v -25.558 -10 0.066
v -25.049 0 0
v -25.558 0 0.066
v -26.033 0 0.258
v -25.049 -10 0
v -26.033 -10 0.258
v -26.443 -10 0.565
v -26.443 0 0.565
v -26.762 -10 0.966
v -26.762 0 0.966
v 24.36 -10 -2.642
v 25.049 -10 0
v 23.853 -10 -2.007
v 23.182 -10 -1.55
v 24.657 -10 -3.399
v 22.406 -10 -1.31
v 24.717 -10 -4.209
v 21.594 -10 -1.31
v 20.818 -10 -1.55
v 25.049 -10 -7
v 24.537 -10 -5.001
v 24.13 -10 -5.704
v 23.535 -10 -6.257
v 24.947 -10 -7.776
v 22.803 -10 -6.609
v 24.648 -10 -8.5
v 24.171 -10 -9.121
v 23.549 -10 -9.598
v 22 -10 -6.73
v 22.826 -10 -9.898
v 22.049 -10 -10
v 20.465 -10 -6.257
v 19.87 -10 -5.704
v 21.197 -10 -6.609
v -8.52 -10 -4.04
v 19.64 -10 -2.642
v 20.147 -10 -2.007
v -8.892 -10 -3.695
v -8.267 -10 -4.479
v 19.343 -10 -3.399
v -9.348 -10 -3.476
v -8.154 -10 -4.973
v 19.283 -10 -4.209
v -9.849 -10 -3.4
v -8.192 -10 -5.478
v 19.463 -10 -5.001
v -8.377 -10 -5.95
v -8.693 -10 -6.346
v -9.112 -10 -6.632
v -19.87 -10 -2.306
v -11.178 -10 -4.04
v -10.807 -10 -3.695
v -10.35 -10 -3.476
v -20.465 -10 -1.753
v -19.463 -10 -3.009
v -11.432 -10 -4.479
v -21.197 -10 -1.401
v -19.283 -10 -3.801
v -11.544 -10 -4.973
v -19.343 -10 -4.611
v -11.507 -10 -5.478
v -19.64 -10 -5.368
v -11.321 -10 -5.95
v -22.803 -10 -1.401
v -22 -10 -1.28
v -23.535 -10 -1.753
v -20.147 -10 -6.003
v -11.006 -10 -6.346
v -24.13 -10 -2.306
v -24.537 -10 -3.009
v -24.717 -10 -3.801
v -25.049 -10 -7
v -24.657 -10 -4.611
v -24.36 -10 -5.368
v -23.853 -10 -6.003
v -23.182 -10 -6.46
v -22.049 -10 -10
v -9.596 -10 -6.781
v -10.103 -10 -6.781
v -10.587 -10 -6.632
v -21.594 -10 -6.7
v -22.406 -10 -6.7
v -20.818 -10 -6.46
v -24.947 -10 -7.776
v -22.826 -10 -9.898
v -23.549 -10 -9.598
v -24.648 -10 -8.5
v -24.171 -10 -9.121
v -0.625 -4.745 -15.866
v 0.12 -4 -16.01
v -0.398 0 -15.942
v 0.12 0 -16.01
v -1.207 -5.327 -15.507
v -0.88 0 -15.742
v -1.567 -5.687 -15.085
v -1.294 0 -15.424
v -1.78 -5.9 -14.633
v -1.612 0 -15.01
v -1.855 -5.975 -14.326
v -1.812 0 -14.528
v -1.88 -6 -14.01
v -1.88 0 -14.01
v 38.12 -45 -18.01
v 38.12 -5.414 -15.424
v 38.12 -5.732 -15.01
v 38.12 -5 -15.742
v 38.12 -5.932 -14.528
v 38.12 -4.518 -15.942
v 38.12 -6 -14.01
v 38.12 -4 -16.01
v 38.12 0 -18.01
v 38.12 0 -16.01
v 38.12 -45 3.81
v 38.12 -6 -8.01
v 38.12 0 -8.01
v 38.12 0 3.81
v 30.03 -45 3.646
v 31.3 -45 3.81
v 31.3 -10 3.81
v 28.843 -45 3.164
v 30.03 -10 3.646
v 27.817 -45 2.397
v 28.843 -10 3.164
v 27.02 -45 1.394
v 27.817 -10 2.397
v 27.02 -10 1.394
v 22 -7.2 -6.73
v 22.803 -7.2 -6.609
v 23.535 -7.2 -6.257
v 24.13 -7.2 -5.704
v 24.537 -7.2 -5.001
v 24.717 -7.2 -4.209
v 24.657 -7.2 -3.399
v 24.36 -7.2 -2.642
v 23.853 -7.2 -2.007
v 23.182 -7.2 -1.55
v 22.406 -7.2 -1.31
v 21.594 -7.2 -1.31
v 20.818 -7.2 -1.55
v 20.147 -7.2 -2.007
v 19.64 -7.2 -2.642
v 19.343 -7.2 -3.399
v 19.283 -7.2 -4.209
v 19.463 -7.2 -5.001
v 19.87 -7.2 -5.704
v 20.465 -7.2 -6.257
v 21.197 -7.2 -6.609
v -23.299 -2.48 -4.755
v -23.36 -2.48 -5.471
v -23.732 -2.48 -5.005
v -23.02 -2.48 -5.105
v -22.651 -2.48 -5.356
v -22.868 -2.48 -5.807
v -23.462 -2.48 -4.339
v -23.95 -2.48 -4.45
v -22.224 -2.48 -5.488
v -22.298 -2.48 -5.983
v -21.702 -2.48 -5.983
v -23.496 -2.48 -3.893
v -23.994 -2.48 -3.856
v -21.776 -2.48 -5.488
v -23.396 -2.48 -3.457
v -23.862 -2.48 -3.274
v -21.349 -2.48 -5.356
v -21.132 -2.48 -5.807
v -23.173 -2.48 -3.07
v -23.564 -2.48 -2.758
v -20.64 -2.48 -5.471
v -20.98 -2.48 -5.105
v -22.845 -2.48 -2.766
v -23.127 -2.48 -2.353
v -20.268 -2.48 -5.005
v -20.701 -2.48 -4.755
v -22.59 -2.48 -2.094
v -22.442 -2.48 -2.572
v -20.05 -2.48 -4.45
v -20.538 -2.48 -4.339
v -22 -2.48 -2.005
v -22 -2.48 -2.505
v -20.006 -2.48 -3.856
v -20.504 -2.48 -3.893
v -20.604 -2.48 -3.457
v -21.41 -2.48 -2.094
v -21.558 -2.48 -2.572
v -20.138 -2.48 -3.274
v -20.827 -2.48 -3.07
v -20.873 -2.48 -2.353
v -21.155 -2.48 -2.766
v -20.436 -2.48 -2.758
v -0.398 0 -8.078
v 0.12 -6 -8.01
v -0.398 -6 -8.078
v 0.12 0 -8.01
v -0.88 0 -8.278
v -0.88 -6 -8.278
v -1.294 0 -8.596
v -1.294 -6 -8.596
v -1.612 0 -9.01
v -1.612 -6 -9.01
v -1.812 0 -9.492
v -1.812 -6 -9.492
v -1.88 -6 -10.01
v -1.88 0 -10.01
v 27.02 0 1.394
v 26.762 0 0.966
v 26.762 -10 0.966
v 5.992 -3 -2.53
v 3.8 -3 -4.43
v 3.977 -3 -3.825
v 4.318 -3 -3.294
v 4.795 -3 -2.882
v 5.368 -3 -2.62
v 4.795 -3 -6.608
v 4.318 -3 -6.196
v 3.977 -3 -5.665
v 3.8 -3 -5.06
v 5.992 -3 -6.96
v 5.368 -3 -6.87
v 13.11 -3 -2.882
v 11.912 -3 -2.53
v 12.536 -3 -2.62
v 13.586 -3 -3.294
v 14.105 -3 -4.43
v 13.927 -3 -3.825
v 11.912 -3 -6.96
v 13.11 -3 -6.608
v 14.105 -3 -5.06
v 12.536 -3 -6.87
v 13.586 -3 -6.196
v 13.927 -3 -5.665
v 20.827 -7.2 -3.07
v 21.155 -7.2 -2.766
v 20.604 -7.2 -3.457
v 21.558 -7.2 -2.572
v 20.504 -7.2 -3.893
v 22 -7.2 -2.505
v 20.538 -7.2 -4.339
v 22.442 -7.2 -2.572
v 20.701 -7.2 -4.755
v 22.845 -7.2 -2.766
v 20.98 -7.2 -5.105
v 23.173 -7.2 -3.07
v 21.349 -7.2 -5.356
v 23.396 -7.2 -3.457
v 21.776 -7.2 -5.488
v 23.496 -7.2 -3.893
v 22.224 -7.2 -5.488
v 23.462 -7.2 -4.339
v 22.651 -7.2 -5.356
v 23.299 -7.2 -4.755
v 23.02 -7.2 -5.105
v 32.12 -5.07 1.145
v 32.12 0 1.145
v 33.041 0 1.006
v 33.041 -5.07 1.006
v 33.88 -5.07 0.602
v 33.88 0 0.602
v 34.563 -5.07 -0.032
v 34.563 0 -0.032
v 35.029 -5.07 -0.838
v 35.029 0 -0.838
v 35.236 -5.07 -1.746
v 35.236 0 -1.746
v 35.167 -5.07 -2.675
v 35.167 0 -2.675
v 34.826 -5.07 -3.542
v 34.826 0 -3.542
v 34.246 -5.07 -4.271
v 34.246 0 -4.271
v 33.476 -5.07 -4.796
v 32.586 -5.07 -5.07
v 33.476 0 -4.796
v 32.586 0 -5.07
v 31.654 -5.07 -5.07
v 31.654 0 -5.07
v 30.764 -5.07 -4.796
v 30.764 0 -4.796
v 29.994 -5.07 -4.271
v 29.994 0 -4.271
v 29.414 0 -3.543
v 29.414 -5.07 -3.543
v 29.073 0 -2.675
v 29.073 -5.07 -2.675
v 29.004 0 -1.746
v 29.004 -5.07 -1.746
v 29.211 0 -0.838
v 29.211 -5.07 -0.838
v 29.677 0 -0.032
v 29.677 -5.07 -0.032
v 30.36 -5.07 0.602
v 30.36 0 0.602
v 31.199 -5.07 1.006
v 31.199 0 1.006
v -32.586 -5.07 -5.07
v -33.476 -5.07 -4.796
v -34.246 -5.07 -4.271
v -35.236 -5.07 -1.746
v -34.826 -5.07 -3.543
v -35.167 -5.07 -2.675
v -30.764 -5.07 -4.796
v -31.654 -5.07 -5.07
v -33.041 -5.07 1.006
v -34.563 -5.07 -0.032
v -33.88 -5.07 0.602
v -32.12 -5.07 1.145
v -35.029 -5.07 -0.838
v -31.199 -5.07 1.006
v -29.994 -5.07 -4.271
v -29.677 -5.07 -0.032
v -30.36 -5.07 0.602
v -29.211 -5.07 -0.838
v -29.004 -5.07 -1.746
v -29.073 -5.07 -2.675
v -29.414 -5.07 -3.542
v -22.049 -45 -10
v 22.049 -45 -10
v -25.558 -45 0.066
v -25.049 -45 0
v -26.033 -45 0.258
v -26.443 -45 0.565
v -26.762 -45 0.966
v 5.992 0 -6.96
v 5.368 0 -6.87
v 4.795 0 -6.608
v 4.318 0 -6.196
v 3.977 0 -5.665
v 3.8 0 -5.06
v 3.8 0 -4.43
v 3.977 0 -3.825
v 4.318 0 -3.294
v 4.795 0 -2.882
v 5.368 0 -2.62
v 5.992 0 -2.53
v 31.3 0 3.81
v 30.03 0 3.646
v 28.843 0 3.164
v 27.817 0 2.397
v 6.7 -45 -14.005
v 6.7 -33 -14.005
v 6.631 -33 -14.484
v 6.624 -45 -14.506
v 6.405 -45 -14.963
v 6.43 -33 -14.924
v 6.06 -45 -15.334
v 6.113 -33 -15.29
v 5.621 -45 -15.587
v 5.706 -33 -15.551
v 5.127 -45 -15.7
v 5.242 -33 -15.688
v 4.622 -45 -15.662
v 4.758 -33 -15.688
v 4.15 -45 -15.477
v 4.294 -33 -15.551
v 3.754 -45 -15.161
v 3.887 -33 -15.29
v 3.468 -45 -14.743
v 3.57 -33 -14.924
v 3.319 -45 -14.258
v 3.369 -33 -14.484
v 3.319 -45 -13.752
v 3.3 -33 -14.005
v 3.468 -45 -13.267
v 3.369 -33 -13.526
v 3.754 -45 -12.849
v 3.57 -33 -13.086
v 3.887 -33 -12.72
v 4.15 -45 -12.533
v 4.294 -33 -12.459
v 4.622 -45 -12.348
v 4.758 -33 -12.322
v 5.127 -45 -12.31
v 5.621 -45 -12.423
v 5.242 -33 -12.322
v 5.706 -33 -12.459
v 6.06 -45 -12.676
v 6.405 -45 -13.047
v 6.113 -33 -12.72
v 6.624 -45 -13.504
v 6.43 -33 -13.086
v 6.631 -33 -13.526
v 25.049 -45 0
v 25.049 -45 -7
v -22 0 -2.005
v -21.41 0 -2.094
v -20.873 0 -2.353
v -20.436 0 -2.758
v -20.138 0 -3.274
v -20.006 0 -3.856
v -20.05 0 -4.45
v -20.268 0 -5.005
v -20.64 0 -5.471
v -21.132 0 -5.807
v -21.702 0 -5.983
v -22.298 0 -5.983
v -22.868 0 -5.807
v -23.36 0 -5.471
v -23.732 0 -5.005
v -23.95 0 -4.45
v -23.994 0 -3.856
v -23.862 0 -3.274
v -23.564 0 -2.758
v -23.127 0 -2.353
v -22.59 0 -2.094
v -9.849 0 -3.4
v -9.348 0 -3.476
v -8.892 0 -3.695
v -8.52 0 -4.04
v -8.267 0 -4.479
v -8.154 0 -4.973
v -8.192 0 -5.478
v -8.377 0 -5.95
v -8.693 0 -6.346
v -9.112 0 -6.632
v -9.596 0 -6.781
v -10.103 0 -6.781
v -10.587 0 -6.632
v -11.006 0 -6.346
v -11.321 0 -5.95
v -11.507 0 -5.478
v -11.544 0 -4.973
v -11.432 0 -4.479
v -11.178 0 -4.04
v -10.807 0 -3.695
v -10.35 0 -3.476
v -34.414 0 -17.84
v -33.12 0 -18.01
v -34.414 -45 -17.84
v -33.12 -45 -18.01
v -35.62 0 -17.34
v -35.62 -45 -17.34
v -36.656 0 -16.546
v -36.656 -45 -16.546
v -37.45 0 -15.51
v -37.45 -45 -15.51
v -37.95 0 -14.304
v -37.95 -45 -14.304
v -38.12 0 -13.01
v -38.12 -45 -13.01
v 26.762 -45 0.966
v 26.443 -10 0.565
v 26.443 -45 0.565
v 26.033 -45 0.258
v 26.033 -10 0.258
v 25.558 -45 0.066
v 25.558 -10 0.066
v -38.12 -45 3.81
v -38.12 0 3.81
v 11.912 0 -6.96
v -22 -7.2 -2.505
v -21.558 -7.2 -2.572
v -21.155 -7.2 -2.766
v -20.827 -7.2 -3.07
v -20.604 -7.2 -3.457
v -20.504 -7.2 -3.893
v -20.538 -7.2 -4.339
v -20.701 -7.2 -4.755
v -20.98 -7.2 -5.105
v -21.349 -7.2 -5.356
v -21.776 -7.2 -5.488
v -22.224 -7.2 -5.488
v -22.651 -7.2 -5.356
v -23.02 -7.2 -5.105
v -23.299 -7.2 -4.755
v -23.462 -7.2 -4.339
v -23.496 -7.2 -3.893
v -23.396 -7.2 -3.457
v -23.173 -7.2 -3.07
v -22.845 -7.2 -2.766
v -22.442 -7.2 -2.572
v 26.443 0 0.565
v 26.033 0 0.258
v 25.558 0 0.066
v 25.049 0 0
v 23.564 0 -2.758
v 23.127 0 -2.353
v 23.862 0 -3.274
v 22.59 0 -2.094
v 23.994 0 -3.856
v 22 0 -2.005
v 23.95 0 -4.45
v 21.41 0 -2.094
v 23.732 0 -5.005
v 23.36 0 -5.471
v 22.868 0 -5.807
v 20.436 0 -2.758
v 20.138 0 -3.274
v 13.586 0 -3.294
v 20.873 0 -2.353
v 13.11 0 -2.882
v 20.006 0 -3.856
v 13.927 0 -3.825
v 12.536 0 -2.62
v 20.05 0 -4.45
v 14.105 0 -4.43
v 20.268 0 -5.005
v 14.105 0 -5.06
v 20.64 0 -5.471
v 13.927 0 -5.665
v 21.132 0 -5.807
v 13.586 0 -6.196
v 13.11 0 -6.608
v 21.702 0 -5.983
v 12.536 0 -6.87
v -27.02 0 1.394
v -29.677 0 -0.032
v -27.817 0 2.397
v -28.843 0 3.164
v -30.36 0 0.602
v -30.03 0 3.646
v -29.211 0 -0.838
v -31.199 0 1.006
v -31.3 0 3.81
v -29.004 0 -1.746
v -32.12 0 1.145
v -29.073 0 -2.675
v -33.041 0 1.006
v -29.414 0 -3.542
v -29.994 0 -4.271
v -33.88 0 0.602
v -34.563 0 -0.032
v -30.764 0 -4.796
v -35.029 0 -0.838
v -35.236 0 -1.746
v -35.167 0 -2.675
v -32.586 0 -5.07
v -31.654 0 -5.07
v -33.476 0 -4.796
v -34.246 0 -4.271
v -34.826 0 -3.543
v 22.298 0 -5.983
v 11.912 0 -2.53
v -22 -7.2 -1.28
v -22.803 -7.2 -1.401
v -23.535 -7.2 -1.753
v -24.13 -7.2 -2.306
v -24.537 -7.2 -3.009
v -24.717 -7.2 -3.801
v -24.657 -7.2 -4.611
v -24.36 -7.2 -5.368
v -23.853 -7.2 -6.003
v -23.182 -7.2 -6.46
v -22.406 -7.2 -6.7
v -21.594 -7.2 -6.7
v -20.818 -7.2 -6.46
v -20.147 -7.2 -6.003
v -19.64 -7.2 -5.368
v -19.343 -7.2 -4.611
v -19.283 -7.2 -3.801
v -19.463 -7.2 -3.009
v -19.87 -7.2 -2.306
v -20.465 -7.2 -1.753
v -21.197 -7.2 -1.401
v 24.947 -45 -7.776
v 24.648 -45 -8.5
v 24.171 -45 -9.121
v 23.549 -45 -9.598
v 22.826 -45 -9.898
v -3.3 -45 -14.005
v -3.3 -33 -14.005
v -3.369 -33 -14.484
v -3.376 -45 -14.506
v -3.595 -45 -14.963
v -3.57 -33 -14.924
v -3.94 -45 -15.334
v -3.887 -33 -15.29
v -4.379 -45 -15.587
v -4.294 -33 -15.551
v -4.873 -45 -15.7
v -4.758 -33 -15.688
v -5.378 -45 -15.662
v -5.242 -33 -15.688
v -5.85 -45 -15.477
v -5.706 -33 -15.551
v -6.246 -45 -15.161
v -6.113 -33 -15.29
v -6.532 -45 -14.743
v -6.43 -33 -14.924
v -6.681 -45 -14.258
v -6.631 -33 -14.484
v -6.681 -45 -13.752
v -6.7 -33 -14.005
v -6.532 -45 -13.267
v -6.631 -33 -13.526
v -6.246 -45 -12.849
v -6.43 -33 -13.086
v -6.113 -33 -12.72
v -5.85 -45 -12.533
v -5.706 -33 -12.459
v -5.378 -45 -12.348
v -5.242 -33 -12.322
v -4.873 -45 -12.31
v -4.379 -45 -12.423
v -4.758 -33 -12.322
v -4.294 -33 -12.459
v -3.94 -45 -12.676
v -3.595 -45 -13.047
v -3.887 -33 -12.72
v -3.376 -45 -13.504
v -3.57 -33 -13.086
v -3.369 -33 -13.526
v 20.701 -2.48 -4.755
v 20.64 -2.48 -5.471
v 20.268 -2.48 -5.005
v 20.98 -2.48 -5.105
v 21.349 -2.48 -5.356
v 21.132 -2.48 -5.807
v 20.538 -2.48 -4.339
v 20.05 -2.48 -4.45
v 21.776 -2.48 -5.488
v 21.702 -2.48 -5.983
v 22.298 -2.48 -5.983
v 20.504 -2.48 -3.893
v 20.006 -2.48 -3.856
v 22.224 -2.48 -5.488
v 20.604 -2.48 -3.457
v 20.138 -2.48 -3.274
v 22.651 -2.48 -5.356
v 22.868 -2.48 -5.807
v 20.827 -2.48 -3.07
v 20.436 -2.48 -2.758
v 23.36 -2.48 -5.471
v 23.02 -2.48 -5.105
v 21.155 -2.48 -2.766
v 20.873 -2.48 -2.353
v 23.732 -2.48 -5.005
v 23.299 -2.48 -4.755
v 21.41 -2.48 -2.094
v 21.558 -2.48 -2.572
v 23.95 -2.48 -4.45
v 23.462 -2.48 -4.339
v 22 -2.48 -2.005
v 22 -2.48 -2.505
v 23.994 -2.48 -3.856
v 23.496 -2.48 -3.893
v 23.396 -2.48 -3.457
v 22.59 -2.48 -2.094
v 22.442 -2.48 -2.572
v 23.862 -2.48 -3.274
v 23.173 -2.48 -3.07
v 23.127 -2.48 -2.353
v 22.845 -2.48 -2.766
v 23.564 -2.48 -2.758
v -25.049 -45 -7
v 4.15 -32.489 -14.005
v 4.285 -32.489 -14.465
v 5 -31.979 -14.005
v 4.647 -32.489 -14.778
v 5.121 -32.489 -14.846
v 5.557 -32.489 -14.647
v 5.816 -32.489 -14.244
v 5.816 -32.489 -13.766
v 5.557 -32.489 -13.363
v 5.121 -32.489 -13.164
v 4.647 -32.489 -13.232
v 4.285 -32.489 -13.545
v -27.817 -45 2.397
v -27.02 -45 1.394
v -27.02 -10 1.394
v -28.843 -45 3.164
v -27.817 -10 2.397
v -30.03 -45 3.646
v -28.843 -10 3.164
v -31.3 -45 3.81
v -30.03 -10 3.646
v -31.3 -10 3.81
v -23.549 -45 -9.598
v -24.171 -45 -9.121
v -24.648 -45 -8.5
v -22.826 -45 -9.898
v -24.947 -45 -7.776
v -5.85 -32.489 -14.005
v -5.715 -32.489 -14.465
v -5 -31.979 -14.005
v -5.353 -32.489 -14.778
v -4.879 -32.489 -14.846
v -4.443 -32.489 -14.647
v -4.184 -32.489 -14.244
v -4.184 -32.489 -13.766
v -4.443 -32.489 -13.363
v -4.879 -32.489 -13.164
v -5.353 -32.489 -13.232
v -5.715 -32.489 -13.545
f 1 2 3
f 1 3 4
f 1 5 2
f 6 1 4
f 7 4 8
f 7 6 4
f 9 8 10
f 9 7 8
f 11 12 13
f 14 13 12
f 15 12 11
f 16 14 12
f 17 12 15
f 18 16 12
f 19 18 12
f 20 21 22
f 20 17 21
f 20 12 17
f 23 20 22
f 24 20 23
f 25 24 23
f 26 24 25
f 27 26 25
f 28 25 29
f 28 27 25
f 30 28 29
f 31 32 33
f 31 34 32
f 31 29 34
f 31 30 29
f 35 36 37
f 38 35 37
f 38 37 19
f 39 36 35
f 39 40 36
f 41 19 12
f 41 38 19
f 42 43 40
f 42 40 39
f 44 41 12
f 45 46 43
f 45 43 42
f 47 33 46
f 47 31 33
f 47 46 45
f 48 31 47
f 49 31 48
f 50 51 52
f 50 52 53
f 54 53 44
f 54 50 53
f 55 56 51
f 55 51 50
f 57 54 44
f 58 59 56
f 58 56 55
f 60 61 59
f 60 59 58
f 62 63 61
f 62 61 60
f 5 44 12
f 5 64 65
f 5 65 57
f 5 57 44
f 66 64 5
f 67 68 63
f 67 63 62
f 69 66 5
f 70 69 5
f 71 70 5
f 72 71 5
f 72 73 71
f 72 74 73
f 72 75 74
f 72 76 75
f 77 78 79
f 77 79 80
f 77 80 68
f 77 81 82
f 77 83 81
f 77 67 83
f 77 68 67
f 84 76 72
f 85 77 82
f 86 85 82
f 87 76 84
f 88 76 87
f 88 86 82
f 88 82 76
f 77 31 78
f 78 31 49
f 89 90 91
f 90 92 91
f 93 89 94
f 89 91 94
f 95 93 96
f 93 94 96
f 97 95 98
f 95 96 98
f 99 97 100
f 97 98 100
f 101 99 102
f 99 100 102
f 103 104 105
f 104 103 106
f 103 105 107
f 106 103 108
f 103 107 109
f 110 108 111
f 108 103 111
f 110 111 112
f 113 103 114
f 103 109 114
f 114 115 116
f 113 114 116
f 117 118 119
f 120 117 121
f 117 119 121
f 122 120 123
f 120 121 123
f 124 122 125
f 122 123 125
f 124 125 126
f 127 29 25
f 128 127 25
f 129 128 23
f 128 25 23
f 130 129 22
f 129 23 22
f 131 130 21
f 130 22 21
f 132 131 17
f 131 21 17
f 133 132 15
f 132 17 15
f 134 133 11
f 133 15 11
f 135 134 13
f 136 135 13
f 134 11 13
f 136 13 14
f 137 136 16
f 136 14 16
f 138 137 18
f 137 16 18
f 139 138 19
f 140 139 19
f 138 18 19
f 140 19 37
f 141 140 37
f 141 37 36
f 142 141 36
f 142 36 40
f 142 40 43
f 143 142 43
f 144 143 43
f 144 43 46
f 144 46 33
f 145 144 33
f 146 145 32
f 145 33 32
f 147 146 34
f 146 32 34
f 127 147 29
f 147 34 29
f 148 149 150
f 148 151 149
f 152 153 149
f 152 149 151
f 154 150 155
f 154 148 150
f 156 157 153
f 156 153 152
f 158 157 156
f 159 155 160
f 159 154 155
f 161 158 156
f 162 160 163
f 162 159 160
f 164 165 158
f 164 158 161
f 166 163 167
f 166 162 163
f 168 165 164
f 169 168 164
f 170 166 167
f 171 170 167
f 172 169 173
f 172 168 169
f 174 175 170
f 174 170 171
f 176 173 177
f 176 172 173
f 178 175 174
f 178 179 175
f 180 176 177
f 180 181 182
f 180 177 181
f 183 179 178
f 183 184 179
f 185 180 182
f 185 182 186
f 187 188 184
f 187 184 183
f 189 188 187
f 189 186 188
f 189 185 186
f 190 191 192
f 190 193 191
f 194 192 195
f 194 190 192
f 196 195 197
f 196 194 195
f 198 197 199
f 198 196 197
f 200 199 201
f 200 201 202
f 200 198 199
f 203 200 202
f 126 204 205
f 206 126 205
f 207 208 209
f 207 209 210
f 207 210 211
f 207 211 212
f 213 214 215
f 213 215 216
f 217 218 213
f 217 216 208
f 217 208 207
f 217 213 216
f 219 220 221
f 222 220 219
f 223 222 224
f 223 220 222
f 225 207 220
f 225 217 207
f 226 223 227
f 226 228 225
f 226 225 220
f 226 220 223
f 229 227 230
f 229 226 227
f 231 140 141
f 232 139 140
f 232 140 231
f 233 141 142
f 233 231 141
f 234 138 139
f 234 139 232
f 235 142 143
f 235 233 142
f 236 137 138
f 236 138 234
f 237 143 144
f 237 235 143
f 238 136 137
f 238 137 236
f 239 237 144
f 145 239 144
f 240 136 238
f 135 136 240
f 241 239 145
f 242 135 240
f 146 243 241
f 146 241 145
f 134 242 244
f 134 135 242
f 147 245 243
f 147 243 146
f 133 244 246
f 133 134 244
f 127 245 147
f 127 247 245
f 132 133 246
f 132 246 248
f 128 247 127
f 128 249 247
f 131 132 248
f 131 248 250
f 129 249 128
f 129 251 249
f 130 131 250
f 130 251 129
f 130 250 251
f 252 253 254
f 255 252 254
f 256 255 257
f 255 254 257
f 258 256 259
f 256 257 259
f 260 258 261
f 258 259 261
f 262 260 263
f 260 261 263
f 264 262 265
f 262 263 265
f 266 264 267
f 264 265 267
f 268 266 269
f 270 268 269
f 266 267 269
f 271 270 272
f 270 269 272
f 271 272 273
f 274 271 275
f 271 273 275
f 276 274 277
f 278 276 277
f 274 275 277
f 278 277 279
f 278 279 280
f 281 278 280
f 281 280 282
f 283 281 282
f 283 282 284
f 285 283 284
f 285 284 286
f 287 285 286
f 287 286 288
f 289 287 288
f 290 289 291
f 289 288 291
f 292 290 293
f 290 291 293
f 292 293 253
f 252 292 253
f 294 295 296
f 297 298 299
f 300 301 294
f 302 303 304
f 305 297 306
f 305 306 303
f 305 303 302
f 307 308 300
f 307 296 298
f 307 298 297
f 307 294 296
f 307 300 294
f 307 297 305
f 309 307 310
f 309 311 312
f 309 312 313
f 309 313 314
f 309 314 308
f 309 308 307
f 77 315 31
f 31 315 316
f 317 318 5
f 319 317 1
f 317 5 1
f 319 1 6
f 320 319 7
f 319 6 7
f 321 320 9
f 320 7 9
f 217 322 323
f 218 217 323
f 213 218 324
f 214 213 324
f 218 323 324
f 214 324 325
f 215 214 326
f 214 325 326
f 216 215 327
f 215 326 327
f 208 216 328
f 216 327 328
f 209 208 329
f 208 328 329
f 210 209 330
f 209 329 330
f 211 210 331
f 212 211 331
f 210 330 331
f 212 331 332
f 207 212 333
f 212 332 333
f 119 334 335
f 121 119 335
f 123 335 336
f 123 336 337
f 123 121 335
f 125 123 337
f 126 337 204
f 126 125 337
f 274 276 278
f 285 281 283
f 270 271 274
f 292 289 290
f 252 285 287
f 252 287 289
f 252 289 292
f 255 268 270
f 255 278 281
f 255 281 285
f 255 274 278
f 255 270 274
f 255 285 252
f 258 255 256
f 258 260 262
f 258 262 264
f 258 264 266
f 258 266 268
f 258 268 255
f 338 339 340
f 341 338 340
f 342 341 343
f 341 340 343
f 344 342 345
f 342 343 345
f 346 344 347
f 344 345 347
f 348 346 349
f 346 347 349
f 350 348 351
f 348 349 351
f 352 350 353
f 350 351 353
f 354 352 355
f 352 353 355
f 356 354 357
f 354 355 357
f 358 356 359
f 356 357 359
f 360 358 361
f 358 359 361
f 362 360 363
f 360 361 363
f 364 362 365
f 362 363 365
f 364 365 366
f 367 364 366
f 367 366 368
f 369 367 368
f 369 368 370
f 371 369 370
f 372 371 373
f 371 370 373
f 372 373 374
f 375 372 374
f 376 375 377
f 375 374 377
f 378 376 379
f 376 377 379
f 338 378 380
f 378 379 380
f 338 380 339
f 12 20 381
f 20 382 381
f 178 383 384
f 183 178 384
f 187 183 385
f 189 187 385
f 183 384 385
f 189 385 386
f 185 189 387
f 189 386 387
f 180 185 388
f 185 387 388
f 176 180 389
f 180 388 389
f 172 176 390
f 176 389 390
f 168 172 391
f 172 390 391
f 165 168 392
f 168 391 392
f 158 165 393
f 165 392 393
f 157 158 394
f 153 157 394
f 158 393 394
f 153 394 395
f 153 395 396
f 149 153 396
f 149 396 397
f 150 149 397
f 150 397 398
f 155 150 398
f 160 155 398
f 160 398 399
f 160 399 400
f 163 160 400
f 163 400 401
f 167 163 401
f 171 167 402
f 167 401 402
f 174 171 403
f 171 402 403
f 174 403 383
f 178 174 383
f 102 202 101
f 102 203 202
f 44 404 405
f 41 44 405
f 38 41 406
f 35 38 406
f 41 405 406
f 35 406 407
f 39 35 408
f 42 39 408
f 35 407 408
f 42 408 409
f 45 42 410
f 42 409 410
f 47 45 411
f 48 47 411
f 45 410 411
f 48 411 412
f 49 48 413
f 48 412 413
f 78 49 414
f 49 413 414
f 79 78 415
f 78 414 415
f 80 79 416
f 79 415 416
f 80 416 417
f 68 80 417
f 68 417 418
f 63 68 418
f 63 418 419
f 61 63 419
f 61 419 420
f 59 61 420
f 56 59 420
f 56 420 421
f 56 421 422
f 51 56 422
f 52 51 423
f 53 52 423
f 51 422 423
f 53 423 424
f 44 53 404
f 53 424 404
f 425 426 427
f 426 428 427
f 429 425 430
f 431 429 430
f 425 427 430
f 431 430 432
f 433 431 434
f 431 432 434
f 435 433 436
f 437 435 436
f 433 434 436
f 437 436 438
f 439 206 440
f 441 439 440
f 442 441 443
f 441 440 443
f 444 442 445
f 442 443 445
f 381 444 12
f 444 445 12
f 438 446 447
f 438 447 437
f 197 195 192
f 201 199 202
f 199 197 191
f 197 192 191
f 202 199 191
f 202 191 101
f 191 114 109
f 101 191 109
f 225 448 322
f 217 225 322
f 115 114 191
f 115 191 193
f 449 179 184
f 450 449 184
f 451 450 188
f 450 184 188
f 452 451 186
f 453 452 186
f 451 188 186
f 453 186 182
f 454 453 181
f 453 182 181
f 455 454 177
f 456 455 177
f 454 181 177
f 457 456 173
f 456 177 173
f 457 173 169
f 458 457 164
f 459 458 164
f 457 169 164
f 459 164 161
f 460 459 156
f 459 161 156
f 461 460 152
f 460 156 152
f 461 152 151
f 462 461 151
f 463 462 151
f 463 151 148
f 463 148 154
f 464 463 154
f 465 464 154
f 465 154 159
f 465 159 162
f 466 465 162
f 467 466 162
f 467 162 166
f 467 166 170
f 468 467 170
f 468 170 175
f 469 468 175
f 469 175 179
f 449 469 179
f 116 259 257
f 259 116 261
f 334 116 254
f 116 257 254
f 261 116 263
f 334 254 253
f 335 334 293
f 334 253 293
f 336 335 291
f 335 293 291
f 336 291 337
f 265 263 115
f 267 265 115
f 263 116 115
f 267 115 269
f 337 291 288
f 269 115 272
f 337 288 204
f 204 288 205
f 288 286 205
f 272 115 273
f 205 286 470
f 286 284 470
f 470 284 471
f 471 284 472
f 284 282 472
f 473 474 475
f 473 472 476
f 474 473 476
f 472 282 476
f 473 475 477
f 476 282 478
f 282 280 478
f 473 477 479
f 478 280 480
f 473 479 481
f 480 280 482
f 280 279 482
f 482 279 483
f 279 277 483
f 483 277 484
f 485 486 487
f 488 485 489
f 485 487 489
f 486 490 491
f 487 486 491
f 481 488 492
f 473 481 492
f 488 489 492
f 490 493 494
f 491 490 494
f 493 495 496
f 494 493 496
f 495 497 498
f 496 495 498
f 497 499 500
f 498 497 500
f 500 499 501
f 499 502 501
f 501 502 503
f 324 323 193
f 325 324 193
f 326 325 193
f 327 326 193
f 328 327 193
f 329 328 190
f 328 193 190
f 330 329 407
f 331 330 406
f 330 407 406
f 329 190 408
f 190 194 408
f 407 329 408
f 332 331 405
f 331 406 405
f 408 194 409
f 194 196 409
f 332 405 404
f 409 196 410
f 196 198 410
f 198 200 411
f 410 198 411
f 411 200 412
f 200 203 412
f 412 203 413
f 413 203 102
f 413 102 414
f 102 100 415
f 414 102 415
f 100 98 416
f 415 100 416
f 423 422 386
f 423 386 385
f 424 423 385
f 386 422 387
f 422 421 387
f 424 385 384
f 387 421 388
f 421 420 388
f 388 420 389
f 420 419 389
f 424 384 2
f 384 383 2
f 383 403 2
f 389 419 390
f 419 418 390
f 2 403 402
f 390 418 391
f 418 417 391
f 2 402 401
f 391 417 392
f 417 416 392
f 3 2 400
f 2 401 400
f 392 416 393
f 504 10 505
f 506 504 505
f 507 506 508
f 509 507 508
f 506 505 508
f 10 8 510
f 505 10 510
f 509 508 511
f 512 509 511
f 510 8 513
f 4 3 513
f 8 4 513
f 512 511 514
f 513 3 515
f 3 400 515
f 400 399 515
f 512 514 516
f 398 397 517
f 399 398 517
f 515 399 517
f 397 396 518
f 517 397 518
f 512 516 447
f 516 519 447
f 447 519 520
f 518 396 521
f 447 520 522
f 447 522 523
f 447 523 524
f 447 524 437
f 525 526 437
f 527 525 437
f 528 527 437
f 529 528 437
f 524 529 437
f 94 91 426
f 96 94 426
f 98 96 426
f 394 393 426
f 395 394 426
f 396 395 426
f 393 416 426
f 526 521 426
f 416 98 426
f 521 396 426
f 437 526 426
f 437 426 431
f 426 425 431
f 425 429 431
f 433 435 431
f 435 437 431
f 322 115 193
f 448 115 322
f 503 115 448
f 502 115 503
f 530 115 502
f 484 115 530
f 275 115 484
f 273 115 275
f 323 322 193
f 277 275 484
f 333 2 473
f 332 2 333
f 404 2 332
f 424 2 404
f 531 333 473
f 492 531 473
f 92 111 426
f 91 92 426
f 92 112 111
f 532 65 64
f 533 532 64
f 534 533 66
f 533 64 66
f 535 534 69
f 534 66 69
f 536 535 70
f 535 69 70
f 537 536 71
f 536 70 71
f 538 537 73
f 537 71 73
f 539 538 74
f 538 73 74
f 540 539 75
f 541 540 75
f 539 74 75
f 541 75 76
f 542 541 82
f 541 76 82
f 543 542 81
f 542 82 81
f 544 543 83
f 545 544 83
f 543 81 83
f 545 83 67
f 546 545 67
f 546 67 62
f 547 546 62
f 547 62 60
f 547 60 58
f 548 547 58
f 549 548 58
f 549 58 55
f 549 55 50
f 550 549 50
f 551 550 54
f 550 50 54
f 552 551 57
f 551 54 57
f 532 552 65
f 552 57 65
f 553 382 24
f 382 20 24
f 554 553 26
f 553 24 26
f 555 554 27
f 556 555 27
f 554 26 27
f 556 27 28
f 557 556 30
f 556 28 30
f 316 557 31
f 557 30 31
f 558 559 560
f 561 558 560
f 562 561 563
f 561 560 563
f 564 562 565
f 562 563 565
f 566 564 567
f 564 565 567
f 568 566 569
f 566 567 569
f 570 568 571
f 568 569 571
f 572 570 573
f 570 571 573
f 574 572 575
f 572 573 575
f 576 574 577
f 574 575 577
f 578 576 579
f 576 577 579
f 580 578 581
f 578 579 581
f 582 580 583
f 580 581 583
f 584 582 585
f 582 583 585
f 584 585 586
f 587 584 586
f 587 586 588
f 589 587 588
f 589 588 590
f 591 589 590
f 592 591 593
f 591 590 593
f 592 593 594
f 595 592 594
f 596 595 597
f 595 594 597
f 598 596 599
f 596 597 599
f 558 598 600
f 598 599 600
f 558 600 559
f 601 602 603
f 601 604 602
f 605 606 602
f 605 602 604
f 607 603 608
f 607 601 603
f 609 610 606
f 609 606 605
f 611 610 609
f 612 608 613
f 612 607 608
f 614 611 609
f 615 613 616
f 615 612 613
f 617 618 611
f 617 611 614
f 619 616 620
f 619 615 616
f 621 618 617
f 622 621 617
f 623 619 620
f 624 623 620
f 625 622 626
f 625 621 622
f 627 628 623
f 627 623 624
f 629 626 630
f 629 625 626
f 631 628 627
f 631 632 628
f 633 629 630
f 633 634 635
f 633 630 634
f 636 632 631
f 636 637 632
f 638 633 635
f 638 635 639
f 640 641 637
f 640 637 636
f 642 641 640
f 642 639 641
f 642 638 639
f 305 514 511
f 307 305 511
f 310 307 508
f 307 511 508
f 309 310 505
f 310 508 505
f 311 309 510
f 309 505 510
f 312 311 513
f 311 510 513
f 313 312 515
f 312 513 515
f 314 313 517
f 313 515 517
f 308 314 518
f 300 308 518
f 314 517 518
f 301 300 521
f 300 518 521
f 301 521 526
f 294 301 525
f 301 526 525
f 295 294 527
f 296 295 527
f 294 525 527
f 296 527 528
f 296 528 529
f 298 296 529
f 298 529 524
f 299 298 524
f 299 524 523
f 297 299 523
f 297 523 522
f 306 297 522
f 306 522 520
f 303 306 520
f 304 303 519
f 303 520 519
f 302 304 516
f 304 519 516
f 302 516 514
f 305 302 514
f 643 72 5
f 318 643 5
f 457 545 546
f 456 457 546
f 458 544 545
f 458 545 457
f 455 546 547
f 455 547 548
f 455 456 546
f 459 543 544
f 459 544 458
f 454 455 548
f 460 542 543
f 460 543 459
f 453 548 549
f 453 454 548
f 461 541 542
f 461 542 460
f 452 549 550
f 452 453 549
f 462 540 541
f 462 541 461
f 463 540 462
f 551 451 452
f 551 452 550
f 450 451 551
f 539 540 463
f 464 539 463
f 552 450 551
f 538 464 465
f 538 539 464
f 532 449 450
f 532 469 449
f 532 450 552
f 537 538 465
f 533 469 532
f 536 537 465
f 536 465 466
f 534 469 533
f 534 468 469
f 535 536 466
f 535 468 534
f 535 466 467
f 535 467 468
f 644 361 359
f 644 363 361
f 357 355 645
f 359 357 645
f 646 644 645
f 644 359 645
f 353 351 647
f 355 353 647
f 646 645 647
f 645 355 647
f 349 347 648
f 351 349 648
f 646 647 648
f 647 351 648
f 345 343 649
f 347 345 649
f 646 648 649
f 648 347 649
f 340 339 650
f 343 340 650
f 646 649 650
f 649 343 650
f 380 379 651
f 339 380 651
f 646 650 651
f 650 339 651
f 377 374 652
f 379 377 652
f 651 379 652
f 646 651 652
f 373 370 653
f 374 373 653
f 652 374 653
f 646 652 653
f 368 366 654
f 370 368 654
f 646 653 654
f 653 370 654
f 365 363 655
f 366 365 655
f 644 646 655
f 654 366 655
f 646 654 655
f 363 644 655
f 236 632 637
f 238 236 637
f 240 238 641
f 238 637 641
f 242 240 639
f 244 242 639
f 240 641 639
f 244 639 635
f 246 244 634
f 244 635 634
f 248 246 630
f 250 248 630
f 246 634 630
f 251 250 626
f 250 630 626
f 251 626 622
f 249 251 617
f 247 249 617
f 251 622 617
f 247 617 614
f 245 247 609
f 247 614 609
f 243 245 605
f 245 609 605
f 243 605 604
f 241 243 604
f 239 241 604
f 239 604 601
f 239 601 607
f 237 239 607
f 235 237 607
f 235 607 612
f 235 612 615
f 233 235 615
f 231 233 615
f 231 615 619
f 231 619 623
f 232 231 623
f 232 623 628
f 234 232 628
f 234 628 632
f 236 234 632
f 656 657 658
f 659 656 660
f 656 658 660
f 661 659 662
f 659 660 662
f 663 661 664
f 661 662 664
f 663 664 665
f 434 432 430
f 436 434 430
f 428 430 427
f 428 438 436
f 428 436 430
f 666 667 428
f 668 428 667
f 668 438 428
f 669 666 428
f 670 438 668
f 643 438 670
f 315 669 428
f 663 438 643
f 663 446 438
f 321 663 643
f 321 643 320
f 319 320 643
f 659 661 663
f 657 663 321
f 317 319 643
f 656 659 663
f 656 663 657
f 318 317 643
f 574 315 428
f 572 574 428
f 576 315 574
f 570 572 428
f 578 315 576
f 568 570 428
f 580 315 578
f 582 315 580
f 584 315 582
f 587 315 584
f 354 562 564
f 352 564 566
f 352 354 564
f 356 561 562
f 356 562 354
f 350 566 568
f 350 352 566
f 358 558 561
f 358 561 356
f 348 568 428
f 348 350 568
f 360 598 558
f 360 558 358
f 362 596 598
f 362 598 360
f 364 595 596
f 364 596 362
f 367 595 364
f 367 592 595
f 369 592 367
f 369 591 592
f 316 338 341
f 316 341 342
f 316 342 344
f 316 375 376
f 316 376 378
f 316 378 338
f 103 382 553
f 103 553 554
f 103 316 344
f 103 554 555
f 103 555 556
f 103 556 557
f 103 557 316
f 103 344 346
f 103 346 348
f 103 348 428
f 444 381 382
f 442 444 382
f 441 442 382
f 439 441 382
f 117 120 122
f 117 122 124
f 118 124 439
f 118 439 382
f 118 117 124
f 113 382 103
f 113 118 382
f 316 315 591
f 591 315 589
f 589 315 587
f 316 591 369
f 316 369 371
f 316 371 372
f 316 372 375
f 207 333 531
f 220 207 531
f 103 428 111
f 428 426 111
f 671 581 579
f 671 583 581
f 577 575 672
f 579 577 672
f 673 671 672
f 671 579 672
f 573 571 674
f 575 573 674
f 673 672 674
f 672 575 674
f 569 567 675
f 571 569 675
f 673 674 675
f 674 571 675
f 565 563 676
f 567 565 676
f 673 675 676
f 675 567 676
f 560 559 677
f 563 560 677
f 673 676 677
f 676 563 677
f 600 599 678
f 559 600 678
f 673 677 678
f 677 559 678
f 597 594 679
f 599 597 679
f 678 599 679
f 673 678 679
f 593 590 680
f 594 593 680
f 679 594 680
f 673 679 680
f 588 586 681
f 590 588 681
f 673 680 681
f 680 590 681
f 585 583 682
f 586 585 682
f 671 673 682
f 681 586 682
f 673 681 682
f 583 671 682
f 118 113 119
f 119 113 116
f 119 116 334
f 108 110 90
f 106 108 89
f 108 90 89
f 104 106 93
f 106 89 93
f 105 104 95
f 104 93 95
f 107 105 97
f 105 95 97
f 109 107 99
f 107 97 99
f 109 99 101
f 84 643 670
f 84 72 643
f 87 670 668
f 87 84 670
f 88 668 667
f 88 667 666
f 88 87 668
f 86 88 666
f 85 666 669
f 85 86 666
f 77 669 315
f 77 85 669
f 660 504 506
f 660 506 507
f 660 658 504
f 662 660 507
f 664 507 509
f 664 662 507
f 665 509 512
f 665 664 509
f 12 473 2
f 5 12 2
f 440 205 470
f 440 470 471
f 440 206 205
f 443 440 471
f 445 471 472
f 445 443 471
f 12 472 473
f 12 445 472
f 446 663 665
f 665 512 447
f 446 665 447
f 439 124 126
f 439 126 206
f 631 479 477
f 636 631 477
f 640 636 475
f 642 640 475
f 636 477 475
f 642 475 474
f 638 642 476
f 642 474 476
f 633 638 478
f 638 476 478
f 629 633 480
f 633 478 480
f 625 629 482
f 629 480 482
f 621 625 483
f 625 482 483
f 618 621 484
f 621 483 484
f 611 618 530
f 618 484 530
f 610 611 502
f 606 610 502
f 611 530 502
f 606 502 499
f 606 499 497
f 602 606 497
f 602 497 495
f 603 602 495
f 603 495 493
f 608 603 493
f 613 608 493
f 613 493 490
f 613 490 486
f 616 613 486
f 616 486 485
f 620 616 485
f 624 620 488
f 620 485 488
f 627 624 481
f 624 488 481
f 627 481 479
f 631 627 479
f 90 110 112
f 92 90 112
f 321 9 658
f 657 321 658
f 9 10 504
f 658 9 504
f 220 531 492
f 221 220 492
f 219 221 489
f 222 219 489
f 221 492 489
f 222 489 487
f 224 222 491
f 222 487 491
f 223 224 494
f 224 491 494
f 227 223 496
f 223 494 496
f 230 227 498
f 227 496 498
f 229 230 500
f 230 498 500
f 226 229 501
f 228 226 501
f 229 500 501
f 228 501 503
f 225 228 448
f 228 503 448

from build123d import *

# Parameters (mm, degrees)
SKETCH1_R                      = 2
SKETCH1_R_2                    = 3.125
SKETCH1_R_3                    = 1.7
BOSS_EXTRUDE1_DEPTH            = 10
FILLET2_R                      = 5
FILLET1_R                      = 2
SKETCH1_4_R                    = 3.125
CUT_EXTRUDE3_DEPTH             = 5.07
SKETCH1_7_R                    = 1.7
CUT_EXTRUDE6_DEPTH             = 10
CUT_EXTRUDE5_DEPTH             = 3
SKETCH1_5_R                    = 2
CUT_EXTRUDE4_DEPTH             = 2.48
SKETCH4_R                      = 1.5
CUT_EXTRUDE7_DEPTH             = 10
SKETCH5_R                      = 2.725
CUT_EXTRUDE8_DEPTH             = 2.8
BOSS_EXTRUDE2_DEPTH            = 10
BOSS_EXTRUDE3_DEPTH            = 35
FILLET13_R                     = 5
SKETCH10_W                     = 8
SKETCH10_H                     = 6
CUT_EXTRUDE12_DEPTH            = 40
FILLET14_R                     = 2
SKETCH27_W                     = 50.098907978
SKETCH27_H                     = 10
CUT_EXTRUDE22_DEPTH            = 35
FILLET17_R                     = 3
CBORE_FOR_M3_SHCS1_D           = 3.4
CBORE_FOR_M3_SHCS1_DEPTH       = 20
CBORE_FOR_M3_SHCS1_CBORE_D     = 6.5
CBORE_FOR_M3_SHCS1_CBORE_DEPTH = 3
CBORE_FOR_M3_SHCS1_TIP         = 1.021463052


with BuildPart() as part:
    # Sketch1 → Boss-Extrude1 (new body)
    with BuildSketch(Plane(origin=(0, 0, 0), x_dir=(1, 0, 0), z_dir=(0, 1, 0))):
        with BuildLine():
            ThreePointArc((-11.409245094, 8.977987014), (-9.849239736, 9.28), (-8.289234378, 8.977987014))
            ThreePointArc((-8.289234378, 8.977987014), (-5.835653376, 8.254222737), (-3.289234378, 8.01))
            Line((-3.289234378, 8.01), (38.12, 8.01))
            Line((38.12, 8.01), (38.12, -3.81))
            Line((38.12, -3.81), (28.478275237, -3.81))
            Line((28.478275237, -3.81), (26.178275237, 0))
            Line((26.178275237, 0), (-26.178275237, 0))
            Line((-26.178275237, 0), (-28.478275237, -3.81))
            Line((-28.478275237, -3.81), (-38.12, -3.81))
            Line((-38.12, -3.81), (-38.12, 8.01))
            Line((-38.12, 8.01), (-16.409245094, 8.01))
            ThreePointArc((-16.409245094, 8.01), (-13.862826096, 8.254222737), (-11.409245094, 8.977987014))
        make_face()
        with Locations((22, 4.005)):
            Circle(SKETCH1_R, mode=Mode.SUBTRACT)
        with Locations((-22, 4.005)):
            Circle(SKETCH1_R, mode=Mode.SUBTRACT)
        with Locations((-32.12, 1.98)):
            Circle(SKETCH1_R_2, mode=Mode.SUBTRACT)
        with Locations((32.12, 1.98)):
            Circle(SKETCH1_R_2, mode=Mode.SUBTRACT)
        with Locations((-9.849239736, 5.1)):
            Circle(SKETCH1_R_3, mode=Mode.SUBTRACT)
        with BuildLine():
            ThreePointArc((11.912105026, 2.53), (14.127105026, 4.745), (11.912105026, 6.96))
            Line((11.912105026, 6.96), (5.992105026, 6.96))
            ThreePointArc((5.992105026, 6.96), (3.777105026, 4.745), (5.992105026, 2.53))
            Line((5.992105026, 2.53), (11.912105026, 2.53))
        make_face(mode=Mode.SUBTRACT)
        with Locations((-22, 4.005)):
            Circle(SKETCH1_R)
        with Locations((-9.849239736, 5.1)):
            Circle(SKETCH1_R_3)
        with Locations((-32.12, 1.98)):
            Circle(SKETCH1_R_2)
        with BuildLine():
            Line((5.992105026, 2.53), (11.912105026, 2.53))
            ThreePointArc((11.912105026, 2.53), (14.127105026, 4.745), (11.912105026, 6.96))
            Line((11.912105026, 6.96), (5.992105026, 6.96))
            ThreePointArc((5.992105026, 6.96), (3.777105026, 4.745), (5.992105026, 2.53))
        make_face()
        with Locations((22, 4.005)):
            Circle(SKETCH1_R)
        with Locations((32.12, 1.98)):
            Circle(SKETCH1_R_2)
    extrude(amount=-BOSS_EXTRUDE1_DEPTH)

    # Fillet2
    fillet2_edges = [part.edges().sort_by_distance(p)[0] for p in [
        (28.478275237, -5, 3.81),
        (-28.478275237, -5, 3.81),
    ]]
    fillet(fillet2_edges, radius=FILLET2_R)

    # Fillet1
    fillet1_edges = [part.edges().sort_by_distance(p)[0] for p in [
        (26.178275237, -5, 0),
        (-26.178275237, -5, 0),
    ]]
    fillet(fillet1_edges, radius=FILLET1_R)

    # Sketch1_4 → Cut-Extrude3 (cut)
    with BuildSketch(Plane(origin=(0, 0, 0), x_dir=(1, 0, 0), z_dir=(0, 1, 0))):
        with Locations(Location((32.12, 1.98, 0), (0, 0, 270))):
            Circle(SKETCH1_4_R)
        with Locations(Location((-32.12, 1.98, 0), (0, 0, 270))):
            Circle(SKETCH1_4_R)
    extrude(amount=-CUT_EXTRUDE3_DEPTH, mode=Mode.SUBTRACT)

    # Sketch1_7 → Cut-Extrude6 (cut)
    with BuildSketch(Plane(origin=(0, 0, 0), x_dir=(1, 0, 0), z_dir=(0, 1, 0))):
        with Locations(Location((-9.849239736, 5.1, 0), (0, 0, 270))):
            Circle(SKETCH1_7_R)
    extrude(amount=-CUT_EXTRUDE6_DEPTH, mode=Mode.SUBTRACT)

    # Sketch1_6 → Cut-Extrude5 (cut)
    with BuildSketch(Plane(origin=(0, 0, 0), x_dir=(1, 0, 0), z_dir=(0, 1, 0))):
        with BuildLine():
            Line((5.992105026, 2.53), (11.912105026, 2.53))
            ThreePointArc((11.912105026, 2.53), (14.127105026, 4.745), (11.912105026, 6.96))
            Line((11.912105026, 6.96), (5.992105026, 6.96))
            ThreePointArc((5.992105026, 6.96), (3.777105026, 4.745), (5.992105026, 2.53))
        make_face()
    extrude(amount=-CUT_EXTRUDE5_DEPTH, mode=Mode.SUBTRACT)

    # Sketch1_5 → Cut-Extrude4 (cut)
    with BuildSketch(Plane(origin=(0, 0, 0), x_dir=(1, 0, 0), z_dir=(0, 1, 0))):
        with Locations(Location((-22, 4.005, 0), (0, 0, 270))):
            Circle(SKETCH1_5_R)
        with Locations(Location((22, 4.005, 0), (0, 0, 270))):
            Circle(SKETCH1_5_R)
    extrude(amount=-CUT_EXTRUDE4_DEPTH, mode=Mode.SUBTRACT)

    # Sketch4 → Cut-Extrude7 (cut)
    with BuildSketch(Plane(origin=(0, 0, 0), x_dir=(1, 0, 0), z_dir=(0, 1, 0))):
        with Locations(Location((-22, 4.005, 0), (0, 0, 270))):
            Circle(SKETCH4_R)
        with Locations(Location((22, 4.005, 0), (0, 0, 270))):
            Circle(SKETCH4_R)
    extrude(amount=-CUT_EXTRUDE7_DEPTH, mode=Mode.SUBTRACT)

    # Sketch5 → Cut-Extrude8 (cut)
    with BuildSketch(Plane.XZ.offset(10)):
        with Locations(Location((22, -4.005, 0), (0, 0, 270))):
            Circle(SKETCH5_R)
        with Locations(Location((-22, -4.005, 0), (0, 0, 90))):
            Circle(SKETCH5_R)
    extrude(amount=-CUT_EXTRUDE8_DEPTH, mode=Mode.SUBTRACT)

    # Sketch6 → Boss-Extrude2 (add)
    with BuildSketch(Plane(origin=(0, 0, 0), x_dir=(1, 0, 0), z_dir=(0, 1, 0))):
        with BuildLine():
            Line((-38.12, 8.01), (-38.12, 18.01))
            Line((-38.12, 18.01), (38.12, 18.01))
            Line((38.12, 18.01), (38.12, 8.01))
            Line((38.12, 8.01), (-3.289234378, 8.01))
            ThreePointArc((-3.289234378, 8.01), (-5.835653376, 8.254222737), (-8.289234378, 8.977987014))
            ThreePointArc((-8.289234378, 8.977987014), (-9.849239736, 9.28), (-11.409245094, 8.977987014))
            ThreePointArc((-11.409245094, 8.977987014), (-13.862826096, 8.254222737), (-16.409245094, 8.01))
            Line((-16.409245094, 8.01), (-38.12, 8.01))
        make_face()
    extrude(amount=-BOSS_EXTRUDE2_DEPTH)

    # Sketch8 → Boss-Extrude3 (add)
    with BuildSketch(Plane.XZ.offset(10)):
        with BuildLine():
            Line((18.950546011, 0), (-18.950546011, 0))
            Line((-18.950546011, 0), (-18.950546011, -4.005))
            ThreePointArc((-18.950546011, -4.005), (-22, -7.054453989), (-25.049453989, -4.005))
            Line((-25.049453989, -4.005), (-25.049453989, 0))
            ThreePointArc((-25.049453989, 0), (-26.032503369, 0.25827272), (-26.761657912, 0.966386084))
            Line((-26.761657912, 0.966386084), (-27.019818549, 1.394034791))
            ThreePointArc((-27.019818549, 1.394034791), (-28.842704905, 3.164318199), (-31.300328355, 3.81))
            Line((-31.300328355, 3.81), (-38.12, 3.81))
            Line((-38.12, 3.81), (-38.12, -18.01))
            Line((-38.12, -18.01), (38.12, -18.01))
            Line((38.12, -18.01), (38.12, 3.81))
            Line((38.12, 3.81), (31.300328355, 3.81))
            ThreePointArc((31.300328355, 3.81), (28.842704905, 3.164318199), (27.019818549, 1.394034791))
            Line((27.019818549, 1.394034791), (26.761657912, 0.966386084))
            ThreePointArc((26.761657912, 0.966386084), (26.032503369, 0.25827272), (25.049453989, 0))
            Line((25.049453989, 0), (25.049453989, -4.005))
            ThreePointArc((25.049453989, -4.005), (22, -7.054453989), (18.950546011, -4.005))
            Line((18.950546011, -4.005), (18.950546011, 0))
        make_face()
    extrude(amount=BOSS_EXTRUDE3_DEPTH)

    # Fillet13
    fillet13_edges = [part.edges().sort_by_distance(p)[0] for p in [
        (-38.12, -22.5, -18.01),
    ]]
    fillet(fillet13_edges, radius=FILLET13_R)

    # Sketch10 → Cut-Extrude12 (cut)
    with BuildSketch(Plane(origin=(38.12, 0, 0), x_dir=(0, 0, -1), z_dir=(1, 0, 0))):
        with Locations((12.01, -3)):
            Rectangle(SKETCH10_W, SKETCH10_H)
    extrude(amount=-CUT_EXTRUDE12_DEPTH, mode=Mode.SUBTRACT)

    # Fillet14
    fillet14_edges = [part.edges().sort_by_distance(p)[0] for p in [
        (-1.88, -3, -16.01),
        (18.12, -6, -16.01),
        (-1.88, -3, -8.01),
    ]]
    fillet(fillet14_edges, radius=FILLET14_R)

    # Sketch27 → Cut-Extrude22 (cut)
    with BuildSketch(Plane.XZ.offset(45)):
        with Locations((0, -5)):
            Rectangle(SKETCH27_W, SKETCH27_H)
    extrude(amount=-CUT_EXTRUDE22_DEPTH, mode=Mode.SUBTRACT)

    # Fillet17
    fillet17_edges = [part.edges().sort_by_distance(p)[0] for p in [
        (-25.049453989, -27.5, -10),
        (25.049453989, -27.5, -10),
    ]]
    fillet(fillet17_edges, radius=FILLET17_R)

    # CBORE for M3 SHCS1
    with Locations(Plane(origin=(0, -53, 22.49), x_dir=(-1, 0, 0), z_dir=(0, -1, 0))):
        with Locations((-5, 36.495), (5, 36.495)):
            CounterBoreHole(CBORE_FOR_M3_SHCS1_D / 2, CBORE_FOR_M3_SHCS1_CBORE_D / 2, CBORE_FOR_M3_SHCS1_CBORE_DEPTH, depth=CBORE_FOR_M3_SHCS1_DEPTH)
            with Locations((0, 0, -(CBORE_FOR_M3_SHCS1_DEPTH + CBORE_FOR_M3_SHCS1_TIP / 2))):  # 118° drill point
                Cone(0, CBORE_FOR_M3_SHCS1_D / 2, CBORE_FOR_M3_SHCS1_TIP, mode=Mode.SUBTRACT)


solid = part.part
